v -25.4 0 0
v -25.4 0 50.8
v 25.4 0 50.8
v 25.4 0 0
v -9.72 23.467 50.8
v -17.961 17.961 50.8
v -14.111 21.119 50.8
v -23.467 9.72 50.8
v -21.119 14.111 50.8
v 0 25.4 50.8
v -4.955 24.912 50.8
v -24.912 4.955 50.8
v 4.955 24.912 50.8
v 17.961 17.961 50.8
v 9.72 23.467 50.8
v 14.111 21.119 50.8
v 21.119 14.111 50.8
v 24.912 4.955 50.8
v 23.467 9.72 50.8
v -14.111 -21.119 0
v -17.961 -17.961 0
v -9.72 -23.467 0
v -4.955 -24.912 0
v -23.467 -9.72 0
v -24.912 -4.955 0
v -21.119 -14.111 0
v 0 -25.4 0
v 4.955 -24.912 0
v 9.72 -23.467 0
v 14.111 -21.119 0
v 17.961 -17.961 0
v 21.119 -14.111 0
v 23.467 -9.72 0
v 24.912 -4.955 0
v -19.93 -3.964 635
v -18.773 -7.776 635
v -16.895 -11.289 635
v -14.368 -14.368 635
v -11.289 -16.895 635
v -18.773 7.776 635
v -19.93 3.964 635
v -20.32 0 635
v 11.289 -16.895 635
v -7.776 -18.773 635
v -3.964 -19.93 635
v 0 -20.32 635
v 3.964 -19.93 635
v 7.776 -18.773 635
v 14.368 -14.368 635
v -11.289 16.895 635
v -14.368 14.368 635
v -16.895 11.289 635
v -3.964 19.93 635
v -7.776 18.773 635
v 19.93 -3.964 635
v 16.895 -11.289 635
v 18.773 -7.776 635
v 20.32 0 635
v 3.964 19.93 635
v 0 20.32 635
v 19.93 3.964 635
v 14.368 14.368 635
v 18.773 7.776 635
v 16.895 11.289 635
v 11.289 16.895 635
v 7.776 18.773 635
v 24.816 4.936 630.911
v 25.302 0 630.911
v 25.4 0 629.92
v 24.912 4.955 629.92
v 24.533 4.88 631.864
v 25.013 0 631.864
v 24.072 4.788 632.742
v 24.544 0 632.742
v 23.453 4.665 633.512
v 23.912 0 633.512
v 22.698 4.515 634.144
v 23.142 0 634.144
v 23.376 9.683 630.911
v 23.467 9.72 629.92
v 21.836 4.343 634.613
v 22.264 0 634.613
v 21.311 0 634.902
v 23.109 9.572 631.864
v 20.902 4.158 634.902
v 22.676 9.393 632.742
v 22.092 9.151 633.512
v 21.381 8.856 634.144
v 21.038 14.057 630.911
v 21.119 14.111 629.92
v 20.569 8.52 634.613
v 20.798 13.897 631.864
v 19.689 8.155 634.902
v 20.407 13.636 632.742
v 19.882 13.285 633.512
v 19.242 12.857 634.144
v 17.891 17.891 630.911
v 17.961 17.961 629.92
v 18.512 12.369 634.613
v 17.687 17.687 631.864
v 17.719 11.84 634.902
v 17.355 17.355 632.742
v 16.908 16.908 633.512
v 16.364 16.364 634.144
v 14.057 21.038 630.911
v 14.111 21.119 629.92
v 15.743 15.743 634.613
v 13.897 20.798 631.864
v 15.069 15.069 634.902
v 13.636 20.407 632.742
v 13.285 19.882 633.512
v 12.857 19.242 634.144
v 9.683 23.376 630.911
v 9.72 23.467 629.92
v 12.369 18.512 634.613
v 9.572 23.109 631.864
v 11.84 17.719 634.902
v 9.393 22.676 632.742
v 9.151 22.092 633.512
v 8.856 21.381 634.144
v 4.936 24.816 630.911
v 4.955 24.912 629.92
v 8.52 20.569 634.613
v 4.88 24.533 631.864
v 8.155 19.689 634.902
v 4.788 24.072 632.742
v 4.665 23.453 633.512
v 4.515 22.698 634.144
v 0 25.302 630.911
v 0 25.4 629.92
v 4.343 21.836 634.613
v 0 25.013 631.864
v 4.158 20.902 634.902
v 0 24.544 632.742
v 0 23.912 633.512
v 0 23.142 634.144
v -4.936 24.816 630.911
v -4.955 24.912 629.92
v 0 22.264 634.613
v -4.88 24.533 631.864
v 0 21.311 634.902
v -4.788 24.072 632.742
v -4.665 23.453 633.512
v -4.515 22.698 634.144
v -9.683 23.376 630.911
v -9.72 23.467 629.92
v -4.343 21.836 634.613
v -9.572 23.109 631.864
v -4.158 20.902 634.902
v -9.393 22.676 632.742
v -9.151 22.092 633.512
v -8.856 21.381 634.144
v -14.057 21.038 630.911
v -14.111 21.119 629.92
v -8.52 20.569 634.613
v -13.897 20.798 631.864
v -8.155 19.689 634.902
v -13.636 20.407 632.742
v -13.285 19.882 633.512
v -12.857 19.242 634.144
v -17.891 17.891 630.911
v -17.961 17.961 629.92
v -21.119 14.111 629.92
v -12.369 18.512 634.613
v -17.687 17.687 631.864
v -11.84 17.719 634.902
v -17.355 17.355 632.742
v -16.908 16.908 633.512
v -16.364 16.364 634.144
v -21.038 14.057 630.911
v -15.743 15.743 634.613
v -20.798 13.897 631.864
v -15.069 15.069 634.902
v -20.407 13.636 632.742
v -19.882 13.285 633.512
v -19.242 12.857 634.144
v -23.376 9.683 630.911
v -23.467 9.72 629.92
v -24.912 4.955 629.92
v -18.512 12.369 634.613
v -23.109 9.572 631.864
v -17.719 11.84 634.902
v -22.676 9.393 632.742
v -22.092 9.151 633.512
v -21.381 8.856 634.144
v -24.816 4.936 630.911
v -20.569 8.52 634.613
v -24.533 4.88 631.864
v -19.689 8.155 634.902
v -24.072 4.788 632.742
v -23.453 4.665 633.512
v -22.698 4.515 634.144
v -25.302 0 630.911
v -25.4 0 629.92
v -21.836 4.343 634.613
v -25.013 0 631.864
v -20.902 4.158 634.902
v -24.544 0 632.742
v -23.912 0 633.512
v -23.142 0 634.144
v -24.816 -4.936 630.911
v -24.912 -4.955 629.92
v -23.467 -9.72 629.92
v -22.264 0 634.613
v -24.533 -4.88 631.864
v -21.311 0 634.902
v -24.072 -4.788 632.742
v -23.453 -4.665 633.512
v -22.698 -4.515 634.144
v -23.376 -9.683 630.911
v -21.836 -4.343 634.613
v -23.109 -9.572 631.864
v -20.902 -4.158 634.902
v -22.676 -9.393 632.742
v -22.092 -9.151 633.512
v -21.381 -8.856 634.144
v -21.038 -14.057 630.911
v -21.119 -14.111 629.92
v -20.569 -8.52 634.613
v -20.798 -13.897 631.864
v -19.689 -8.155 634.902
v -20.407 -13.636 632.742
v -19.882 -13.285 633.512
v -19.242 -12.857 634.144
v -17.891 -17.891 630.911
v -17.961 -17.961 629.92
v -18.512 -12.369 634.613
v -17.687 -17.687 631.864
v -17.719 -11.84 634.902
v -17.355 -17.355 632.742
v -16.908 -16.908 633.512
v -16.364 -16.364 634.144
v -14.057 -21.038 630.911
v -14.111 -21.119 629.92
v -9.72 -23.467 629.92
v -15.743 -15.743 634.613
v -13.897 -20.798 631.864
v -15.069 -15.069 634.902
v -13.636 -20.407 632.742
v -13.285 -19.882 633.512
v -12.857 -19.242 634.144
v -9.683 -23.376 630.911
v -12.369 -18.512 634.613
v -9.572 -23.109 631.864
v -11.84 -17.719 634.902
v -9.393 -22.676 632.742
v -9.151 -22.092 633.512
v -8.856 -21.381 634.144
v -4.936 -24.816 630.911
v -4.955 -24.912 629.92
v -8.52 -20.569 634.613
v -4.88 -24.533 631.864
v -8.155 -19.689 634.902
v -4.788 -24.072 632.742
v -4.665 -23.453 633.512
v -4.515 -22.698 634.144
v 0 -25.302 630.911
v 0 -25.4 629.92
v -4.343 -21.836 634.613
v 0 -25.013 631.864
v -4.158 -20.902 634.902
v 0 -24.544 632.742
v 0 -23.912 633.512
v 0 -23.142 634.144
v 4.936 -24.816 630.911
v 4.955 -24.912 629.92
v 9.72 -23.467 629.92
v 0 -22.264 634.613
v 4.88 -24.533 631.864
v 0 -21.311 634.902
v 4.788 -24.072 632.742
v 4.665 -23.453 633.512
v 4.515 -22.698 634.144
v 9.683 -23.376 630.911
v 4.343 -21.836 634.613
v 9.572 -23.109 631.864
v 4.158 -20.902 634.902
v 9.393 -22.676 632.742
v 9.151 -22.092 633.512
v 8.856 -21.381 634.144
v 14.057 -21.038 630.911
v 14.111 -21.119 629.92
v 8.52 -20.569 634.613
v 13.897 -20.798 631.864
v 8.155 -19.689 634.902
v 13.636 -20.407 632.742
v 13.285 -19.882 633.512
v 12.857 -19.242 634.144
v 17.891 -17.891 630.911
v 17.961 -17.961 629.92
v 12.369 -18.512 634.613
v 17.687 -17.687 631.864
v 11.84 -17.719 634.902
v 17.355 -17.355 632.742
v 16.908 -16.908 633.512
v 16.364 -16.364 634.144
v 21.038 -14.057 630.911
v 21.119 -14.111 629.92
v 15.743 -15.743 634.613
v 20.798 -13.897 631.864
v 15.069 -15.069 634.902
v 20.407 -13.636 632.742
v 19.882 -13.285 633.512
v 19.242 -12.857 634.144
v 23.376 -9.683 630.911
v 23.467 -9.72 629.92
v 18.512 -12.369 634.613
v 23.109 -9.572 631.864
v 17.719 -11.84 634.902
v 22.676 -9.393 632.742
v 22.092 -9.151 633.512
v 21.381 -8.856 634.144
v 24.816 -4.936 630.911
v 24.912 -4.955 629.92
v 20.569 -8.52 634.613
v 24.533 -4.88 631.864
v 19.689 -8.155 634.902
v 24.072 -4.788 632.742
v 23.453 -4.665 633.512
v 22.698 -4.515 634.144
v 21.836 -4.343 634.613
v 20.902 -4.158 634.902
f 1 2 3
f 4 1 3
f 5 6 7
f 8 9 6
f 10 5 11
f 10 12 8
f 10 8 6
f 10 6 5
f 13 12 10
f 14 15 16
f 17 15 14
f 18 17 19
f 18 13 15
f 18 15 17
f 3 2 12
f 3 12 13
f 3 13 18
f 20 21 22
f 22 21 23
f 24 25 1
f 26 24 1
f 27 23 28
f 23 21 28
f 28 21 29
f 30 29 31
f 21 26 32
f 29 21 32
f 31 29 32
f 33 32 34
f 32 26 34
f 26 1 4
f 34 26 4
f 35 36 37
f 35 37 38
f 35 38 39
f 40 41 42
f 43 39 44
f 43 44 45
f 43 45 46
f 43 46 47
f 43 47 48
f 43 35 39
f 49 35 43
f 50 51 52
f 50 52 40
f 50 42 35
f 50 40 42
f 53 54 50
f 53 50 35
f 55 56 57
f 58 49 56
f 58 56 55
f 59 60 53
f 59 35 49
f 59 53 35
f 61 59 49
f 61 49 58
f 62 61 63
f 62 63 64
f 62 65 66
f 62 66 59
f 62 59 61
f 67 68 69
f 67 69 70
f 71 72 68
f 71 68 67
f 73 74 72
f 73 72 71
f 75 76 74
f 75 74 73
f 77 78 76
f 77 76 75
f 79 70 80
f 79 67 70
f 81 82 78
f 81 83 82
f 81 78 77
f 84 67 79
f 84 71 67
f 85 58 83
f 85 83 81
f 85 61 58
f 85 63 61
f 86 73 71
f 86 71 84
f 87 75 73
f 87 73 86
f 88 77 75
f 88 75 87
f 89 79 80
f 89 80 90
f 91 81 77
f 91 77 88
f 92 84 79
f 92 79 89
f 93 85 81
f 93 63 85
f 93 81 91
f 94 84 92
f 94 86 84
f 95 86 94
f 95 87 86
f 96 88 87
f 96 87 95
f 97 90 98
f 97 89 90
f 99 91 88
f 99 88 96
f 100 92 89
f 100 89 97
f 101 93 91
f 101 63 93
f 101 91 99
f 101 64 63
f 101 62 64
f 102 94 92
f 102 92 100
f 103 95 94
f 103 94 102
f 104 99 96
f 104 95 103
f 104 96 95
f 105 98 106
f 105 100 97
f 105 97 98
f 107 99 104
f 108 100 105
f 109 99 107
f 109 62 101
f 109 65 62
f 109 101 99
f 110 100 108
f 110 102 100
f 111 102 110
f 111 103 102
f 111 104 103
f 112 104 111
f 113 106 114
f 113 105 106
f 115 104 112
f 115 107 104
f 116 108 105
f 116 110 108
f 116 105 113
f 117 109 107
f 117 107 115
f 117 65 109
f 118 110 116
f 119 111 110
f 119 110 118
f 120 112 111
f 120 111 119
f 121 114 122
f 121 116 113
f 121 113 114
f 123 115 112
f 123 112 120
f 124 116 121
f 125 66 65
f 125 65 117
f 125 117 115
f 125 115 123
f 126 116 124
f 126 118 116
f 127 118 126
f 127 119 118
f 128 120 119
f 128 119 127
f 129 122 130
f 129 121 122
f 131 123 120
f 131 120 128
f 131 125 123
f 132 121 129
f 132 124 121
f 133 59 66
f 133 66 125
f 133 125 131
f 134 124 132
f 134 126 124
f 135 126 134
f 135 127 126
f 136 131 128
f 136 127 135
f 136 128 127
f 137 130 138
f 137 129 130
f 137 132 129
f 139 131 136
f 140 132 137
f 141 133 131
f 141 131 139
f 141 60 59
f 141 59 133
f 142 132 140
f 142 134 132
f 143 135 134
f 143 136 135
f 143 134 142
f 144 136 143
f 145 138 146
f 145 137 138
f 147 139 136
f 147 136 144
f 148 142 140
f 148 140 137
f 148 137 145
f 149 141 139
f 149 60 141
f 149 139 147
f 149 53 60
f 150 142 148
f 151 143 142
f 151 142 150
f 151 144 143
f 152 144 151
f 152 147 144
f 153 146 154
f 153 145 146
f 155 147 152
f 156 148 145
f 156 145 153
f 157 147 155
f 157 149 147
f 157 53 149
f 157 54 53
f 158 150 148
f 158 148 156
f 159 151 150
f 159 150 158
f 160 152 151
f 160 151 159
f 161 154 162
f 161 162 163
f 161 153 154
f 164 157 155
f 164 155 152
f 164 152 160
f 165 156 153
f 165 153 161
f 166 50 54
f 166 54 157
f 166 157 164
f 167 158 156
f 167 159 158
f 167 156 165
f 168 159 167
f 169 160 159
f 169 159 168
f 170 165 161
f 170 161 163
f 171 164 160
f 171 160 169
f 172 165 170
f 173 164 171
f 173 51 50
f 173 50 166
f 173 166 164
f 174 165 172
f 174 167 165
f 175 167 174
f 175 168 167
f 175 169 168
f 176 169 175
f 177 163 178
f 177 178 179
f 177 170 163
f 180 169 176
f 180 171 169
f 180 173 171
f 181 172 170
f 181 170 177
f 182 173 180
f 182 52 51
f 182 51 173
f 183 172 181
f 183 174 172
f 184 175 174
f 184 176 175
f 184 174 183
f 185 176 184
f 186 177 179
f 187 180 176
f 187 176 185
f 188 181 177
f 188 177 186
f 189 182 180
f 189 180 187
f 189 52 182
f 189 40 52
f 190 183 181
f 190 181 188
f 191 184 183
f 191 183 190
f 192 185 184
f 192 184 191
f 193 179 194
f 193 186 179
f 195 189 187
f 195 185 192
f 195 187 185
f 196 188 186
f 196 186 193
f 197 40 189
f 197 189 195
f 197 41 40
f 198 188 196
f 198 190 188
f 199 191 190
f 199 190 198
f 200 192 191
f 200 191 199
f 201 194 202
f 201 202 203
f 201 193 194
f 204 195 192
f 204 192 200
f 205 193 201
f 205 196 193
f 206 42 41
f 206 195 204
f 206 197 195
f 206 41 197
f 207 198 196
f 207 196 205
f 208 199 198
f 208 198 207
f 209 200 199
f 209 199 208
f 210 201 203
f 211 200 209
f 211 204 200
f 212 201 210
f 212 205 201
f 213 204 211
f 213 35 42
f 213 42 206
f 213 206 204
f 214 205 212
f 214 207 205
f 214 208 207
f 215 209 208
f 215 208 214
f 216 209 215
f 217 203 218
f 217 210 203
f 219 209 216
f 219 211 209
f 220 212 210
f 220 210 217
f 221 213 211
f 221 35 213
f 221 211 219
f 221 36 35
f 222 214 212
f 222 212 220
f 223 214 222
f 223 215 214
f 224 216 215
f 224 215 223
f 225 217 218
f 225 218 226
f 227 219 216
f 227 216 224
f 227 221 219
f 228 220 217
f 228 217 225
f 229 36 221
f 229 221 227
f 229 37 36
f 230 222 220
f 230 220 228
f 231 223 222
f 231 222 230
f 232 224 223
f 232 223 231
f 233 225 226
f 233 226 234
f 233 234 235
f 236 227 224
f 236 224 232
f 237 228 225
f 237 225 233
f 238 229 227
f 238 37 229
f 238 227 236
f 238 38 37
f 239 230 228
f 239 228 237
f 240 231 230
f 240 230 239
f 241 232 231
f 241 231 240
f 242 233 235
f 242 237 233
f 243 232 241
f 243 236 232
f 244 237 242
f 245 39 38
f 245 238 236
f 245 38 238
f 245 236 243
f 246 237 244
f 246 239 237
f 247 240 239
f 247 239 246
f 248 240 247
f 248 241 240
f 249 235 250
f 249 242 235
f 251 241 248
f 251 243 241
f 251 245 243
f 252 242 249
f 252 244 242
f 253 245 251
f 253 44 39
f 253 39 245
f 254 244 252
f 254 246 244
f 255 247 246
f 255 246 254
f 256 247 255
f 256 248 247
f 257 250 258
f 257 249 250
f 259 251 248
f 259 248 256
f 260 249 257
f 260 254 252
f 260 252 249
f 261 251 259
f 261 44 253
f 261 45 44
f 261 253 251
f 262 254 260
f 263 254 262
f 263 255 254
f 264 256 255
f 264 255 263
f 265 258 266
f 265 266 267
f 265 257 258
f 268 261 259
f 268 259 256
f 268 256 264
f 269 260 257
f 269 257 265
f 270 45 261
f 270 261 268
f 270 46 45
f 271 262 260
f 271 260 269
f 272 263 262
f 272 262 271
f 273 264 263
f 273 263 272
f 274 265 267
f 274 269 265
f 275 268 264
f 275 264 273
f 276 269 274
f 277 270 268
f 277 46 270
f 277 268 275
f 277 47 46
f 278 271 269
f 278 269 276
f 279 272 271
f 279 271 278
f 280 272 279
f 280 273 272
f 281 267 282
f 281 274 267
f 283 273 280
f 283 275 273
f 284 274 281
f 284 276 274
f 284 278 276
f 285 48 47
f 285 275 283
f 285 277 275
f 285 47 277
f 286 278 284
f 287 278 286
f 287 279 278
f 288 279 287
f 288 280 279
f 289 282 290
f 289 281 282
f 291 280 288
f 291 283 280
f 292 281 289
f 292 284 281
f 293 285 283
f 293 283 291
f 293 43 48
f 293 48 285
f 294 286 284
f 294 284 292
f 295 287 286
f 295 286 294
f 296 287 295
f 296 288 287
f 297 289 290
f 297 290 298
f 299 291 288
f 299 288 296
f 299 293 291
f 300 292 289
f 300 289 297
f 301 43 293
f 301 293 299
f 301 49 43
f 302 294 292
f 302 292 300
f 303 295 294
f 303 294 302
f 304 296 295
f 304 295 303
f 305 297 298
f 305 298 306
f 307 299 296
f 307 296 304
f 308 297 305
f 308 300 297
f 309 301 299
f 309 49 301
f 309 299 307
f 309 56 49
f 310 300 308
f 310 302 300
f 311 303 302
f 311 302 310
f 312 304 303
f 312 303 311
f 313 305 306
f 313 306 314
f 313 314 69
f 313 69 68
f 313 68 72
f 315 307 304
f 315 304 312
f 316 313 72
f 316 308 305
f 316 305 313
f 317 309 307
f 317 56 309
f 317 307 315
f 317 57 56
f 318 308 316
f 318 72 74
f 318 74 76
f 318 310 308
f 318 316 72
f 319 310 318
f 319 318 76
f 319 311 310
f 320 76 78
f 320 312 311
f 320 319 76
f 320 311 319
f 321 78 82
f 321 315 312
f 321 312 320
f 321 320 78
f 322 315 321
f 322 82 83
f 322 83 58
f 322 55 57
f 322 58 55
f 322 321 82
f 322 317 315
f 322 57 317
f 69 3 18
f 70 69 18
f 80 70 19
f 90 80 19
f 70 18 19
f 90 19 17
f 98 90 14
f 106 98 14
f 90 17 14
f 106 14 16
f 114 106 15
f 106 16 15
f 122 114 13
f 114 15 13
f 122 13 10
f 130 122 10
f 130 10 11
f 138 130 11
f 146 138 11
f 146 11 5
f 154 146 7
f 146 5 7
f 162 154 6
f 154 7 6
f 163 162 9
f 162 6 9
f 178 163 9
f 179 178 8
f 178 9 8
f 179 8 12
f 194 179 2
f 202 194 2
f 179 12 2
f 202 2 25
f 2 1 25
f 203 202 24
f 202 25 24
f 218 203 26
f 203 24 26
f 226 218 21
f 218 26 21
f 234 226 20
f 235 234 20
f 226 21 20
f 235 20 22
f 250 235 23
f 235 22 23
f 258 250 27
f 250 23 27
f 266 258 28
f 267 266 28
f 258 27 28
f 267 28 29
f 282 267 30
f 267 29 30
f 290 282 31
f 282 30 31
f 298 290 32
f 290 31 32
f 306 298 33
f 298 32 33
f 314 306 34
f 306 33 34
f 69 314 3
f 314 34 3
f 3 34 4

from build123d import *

# Parameters (mm, degrees)
F0_R     = 25.4
F1_DEPTH = 635
F2_W     = 63.5
F2_H     = 50.8
F3_DEPTH = 25.4
F4_R     = 5.08


with BuildPart() as f1:
    # F0 (on Top) → F1 (new body)
    with BuildSketch(Plane.XY):
        Circle(F0_R)
    extrude(amount=F1_DEPTH)

    # F2 (on Front) → F3 (cut)
    with BuildSketch(Plane.XZ):
        with Locations((0.1835199598, 25.4)):
            Rectangle(F2_W, F2_H)
    extrude(amount=-F3_DEPTH, mode=Mode.SUBTRACT)

    # F4
    f4_edges = [f1.edges().sort_by_distance(p)[0] for p in [
        (-25.4, 0, 635),
    ]]
    fillet(f4_edges, radius=F4_R)


solid = f1.part
